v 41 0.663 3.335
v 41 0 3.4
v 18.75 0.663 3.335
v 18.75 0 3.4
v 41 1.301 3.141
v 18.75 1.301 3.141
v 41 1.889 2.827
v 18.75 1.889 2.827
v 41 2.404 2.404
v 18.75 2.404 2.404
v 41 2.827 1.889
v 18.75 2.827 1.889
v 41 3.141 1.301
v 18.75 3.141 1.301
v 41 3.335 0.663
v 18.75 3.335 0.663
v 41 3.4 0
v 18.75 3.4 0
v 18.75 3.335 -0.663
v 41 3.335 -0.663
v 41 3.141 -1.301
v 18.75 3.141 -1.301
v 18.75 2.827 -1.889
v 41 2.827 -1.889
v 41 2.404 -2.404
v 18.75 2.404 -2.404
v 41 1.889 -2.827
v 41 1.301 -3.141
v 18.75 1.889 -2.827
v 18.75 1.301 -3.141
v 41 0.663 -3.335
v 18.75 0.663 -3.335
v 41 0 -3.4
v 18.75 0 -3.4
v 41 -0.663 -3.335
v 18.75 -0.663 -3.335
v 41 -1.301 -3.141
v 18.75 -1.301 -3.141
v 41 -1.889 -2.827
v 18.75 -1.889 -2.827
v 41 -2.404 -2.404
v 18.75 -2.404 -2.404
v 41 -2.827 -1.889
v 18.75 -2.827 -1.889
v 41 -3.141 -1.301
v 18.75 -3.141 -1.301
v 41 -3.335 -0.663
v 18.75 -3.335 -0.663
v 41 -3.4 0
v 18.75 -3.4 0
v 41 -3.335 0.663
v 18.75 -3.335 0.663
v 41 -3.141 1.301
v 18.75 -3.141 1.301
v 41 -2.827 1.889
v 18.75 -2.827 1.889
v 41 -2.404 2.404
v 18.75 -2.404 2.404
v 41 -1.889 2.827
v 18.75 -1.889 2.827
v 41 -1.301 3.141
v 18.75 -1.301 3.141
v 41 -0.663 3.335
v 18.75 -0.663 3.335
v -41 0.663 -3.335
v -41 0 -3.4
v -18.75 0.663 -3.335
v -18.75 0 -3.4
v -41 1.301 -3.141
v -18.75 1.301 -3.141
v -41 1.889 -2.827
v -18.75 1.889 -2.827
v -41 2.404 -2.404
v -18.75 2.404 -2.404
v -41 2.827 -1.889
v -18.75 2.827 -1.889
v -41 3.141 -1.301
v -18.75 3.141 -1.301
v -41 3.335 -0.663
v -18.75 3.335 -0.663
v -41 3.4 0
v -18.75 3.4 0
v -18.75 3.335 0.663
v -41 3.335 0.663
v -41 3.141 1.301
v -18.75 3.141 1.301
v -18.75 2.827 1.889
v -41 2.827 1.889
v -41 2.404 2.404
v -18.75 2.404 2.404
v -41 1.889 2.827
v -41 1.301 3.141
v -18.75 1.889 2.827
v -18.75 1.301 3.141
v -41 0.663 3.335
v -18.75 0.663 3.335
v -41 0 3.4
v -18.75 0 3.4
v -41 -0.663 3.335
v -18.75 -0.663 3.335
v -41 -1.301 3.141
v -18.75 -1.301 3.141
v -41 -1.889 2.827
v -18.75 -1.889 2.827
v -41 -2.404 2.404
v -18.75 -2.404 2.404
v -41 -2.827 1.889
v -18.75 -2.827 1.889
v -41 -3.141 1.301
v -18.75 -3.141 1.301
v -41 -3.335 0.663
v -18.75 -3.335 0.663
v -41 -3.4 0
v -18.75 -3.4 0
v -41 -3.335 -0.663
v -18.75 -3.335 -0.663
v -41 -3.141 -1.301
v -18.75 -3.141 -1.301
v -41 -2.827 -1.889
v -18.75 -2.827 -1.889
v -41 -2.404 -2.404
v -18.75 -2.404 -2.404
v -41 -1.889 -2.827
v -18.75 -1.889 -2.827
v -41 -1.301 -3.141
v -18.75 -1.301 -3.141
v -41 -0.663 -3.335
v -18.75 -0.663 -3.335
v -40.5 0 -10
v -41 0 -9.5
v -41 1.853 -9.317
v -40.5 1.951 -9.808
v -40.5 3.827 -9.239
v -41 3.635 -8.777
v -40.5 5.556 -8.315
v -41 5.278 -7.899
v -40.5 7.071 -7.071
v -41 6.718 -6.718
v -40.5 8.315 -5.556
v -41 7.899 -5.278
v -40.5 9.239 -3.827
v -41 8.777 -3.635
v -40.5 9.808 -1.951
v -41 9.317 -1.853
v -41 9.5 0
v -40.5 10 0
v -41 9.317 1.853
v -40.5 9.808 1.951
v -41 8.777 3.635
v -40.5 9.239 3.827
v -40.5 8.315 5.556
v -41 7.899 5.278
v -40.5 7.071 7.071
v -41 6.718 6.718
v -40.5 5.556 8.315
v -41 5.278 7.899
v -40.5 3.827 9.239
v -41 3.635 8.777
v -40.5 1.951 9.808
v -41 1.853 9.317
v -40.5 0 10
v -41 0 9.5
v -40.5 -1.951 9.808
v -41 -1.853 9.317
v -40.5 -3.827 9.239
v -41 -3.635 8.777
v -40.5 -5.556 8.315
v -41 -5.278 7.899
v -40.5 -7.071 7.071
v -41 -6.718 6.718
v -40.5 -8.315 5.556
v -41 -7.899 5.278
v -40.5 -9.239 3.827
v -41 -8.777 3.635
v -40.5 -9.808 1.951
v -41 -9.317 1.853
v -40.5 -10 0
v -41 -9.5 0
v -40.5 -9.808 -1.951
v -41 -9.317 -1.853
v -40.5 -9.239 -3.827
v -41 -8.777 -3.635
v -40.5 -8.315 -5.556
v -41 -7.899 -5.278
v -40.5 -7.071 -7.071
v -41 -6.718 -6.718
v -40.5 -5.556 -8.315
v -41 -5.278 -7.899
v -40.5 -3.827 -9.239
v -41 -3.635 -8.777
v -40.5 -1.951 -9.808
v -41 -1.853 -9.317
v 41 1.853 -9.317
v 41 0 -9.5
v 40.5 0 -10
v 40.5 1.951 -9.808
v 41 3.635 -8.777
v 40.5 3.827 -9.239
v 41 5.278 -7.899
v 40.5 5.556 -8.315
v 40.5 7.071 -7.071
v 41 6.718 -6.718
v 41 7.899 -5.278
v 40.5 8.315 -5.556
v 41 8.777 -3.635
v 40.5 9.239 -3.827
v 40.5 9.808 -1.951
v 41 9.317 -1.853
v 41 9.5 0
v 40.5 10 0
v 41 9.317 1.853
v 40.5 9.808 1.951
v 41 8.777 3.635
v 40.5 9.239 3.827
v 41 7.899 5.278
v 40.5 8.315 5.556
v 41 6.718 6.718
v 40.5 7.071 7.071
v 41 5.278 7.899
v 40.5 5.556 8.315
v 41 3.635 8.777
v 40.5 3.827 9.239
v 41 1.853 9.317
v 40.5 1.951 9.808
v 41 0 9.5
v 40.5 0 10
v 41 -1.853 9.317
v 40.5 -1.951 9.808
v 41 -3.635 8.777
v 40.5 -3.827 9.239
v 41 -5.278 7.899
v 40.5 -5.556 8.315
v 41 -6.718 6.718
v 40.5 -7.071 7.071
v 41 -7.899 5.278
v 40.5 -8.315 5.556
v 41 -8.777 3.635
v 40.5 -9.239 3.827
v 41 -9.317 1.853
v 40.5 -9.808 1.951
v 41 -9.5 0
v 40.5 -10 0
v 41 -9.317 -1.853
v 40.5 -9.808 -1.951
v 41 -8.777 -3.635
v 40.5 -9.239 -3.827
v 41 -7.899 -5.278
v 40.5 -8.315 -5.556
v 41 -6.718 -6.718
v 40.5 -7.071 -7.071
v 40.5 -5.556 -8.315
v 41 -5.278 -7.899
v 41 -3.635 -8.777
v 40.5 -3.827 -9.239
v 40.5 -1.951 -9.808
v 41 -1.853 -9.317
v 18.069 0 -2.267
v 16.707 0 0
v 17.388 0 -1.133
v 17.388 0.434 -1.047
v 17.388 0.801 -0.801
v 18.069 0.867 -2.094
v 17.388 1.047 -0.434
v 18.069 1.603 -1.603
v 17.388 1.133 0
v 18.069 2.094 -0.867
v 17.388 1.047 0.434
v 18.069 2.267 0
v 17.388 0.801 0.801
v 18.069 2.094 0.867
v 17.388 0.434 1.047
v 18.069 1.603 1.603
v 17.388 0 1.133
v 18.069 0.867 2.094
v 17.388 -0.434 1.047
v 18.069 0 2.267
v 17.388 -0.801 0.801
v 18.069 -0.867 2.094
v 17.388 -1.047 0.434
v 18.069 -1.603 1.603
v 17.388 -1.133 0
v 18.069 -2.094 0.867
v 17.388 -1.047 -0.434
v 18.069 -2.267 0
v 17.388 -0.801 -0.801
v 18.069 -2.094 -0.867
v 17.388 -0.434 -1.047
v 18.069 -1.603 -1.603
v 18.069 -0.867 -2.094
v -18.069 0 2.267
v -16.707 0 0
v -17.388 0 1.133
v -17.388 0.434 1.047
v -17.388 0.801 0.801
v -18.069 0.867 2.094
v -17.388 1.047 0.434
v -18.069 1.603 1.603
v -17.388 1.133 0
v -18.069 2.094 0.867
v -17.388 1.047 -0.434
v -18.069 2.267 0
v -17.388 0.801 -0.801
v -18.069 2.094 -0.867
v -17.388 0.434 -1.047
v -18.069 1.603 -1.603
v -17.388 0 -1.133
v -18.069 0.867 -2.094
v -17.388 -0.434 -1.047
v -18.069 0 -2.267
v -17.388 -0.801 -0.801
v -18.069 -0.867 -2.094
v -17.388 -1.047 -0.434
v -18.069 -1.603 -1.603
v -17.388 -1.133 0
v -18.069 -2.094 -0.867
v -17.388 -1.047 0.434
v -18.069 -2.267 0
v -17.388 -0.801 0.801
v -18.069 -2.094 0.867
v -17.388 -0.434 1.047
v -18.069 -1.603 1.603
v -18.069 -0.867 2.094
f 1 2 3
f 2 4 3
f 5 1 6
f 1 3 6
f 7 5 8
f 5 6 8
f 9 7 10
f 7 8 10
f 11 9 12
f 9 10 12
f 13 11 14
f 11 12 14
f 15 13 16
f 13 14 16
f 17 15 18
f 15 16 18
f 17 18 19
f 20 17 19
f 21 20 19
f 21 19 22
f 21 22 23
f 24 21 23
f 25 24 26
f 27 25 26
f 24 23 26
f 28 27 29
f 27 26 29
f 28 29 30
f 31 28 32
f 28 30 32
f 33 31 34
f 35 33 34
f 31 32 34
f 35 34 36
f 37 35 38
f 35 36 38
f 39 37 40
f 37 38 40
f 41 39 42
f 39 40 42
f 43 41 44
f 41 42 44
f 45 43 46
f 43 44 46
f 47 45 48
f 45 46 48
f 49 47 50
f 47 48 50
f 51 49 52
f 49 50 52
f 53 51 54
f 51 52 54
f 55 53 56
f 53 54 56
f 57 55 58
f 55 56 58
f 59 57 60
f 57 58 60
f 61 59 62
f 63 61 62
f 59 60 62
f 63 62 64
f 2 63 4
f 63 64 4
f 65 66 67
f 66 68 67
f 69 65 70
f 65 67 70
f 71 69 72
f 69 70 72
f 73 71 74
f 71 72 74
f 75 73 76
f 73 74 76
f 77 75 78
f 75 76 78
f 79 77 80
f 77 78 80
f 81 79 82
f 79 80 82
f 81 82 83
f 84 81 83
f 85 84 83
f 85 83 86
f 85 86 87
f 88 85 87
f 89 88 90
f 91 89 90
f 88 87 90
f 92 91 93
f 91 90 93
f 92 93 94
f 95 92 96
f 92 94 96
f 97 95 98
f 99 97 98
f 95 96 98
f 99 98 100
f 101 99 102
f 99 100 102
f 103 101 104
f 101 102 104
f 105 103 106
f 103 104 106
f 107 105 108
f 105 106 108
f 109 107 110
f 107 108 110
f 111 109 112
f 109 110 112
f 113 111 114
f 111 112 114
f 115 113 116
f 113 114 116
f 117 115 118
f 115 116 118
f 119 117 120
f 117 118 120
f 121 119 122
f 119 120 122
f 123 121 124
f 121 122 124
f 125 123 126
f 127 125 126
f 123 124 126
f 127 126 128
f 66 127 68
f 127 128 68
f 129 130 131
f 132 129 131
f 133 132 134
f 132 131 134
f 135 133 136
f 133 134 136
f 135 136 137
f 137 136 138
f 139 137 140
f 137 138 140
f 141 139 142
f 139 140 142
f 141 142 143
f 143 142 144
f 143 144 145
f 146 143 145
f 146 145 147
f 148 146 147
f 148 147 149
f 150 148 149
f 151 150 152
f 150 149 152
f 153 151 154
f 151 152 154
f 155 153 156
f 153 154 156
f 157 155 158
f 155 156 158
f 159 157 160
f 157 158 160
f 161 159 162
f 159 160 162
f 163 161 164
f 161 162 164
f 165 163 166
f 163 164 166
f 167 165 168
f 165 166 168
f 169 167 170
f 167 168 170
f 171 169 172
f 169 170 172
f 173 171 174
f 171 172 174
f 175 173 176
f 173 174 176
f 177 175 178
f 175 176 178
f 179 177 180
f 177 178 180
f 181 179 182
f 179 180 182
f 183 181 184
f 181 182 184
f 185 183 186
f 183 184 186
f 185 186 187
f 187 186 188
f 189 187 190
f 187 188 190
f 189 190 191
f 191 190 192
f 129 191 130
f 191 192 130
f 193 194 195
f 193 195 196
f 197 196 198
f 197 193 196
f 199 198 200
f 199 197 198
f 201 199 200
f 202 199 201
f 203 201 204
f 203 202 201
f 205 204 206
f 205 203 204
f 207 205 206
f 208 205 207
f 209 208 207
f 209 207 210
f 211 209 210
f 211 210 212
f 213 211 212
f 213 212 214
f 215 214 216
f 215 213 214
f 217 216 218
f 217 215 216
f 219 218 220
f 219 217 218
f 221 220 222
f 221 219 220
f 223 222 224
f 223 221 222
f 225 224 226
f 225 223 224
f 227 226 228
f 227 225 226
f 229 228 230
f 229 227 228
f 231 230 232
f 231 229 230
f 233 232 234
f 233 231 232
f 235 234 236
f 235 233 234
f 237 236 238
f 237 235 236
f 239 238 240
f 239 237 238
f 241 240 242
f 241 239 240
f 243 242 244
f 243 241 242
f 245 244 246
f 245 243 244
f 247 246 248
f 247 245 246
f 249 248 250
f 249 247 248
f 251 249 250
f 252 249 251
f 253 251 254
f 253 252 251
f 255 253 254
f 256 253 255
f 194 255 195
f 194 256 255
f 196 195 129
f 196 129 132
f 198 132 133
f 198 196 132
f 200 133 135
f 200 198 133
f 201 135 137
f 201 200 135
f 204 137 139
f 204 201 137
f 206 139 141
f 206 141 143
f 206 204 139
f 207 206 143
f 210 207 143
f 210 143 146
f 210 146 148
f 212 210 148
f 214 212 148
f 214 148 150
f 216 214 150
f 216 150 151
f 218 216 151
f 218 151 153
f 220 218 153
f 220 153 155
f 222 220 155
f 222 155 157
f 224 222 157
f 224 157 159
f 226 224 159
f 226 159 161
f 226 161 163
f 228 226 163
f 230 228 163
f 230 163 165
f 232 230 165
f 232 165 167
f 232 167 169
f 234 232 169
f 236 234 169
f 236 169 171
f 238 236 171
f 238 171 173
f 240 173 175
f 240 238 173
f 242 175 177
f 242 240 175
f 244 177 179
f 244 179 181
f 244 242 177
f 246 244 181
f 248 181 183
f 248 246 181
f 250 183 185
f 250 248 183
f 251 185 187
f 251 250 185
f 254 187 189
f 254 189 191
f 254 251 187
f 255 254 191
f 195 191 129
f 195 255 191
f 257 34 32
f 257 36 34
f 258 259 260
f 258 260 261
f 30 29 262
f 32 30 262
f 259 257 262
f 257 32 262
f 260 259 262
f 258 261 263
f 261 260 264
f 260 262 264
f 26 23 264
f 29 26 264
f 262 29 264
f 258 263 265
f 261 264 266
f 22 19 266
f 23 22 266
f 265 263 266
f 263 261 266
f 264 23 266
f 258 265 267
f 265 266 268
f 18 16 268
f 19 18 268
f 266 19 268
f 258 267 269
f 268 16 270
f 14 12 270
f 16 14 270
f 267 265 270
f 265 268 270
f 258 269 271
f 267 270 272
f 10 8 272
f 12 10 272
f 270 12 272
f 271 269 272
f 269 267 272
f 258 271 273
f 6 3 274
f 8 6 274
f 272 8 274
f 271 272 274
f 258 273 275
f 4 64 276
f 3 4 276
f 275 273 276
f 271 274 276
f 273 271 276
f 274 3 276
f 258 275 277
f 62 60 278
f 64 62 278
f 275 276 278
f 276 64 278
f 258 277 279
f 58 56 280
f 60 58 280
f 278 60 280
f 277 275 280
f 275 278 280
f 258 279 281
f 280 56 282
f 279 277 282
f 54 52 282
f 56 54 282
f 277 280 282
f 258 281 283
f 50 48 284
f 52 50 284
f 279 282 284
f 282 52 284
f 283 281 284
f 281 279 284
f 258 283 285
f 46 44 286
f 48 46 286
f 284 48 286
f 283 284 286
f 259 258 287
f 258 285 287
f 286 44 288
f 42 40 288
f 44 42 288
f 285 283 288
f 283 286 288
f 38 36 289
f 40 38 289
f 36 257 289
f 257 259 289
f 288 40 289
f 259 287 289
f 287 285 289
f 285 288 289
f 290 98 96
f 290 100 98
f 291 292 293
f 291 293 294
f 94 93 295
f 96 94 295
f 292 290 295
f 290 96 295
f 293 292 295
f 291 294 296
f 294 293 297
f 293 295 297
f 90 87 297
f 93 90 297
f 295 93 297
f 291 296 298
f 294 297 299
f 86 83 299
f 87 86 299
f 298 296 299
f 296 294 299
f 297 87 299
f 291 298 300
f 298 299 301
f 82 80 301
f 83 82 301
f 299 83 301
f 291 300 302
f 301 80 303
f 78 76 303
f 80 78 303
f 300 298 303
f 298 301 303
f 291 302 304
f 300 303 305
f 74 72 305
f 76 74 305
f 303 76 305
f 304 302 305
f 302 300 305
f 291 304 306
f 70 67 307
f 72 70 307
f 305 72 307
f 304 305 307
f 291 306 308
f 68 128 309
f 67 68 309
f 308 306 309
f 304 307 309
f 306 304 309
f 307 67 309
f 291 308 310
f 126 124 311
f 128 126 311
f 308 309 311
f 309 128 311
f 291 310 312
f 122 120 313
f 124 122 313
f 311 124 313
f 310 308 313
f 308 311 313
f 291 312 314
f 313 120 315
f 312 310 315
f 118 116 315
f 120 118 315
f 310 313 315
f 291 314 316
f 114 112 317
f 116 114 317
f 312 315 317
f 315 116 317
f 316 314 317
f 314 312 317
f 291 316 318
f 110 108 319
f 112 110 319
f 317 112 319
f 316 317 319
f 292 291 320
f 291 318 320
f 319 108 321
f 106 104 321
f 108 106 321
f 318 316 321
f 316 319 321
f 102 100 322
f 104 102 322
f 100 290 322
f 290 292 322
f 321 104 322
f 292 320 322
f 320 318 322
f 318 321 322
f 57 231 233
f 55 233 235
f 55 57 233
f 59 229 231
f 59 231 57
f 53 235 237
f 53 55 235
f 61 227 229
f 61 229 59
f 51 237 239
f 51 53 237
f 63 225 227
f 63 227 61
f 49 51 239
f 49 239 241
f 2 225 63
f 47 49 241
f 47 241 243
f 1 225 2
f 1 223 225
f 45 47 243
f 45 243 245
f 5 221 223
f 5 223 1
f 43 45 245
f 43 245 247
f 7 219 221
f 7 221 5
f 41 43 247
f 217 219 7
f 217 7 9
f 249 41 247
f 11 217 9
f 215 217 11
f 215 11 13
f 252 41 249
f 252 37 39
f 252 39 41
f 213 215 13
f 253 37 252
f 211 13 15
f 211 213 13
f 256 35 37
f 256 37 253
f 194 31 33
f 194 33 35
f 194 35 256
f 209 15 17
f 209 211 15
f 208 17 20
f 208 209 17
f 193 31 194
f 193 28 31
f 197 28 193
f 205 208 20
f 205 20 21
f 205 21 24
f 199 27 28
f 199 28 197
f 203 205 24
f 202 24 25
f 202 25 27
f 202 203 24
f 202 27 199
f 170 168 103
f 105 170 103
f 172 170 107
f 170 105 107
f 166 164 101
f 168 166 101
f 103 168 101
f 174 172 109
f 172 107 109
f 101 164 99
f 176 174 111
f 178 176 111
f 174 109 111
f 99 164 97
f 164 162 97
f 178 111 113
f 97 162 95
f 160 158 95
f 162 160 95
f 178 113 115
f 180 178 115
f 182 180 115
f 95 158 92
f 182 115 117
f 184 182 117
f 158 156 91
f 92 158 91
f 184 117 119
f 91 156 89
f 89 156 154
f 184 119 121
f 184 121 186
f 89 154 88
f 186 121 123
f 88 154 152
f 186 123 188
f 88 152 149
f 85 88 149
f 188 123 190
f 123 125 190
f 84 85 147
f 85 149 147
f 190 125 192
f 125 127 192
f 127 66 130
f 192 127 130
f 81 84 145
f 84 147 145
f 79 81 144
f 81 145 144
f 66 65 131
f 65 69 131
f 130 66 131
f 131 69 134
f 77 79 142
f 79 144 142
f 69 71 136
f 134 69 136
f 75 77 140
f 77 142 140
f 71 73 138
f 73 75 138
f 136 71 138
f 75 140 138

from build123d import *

# Parameters (mm, degrees)
SKETCH1_R             = 10
BOSS_EXTRUDE1_DEPTH   = 41
CHAMFER1_SIZE         = 0.5
M8_TAPPED_HOLE1_D     = 6.8
M8_TAPPED_HOLE1_DEPTH = 22.25
M8_TAPPED_HOLE1_TIP   = 2.042926105
M8_TAPPED_HOLE2_D     = 6.8
M8_TAPPED_HOLE2_DEPTH = 22.25
M8_TAPPED_HOLE2_TIP   = 2.042926105


with BuildPart() as part:
    # Sketch1 → Boss-Extrude1 (new, symmetric)
    with BuildSketch(Plane(origin=(0, 0, 0), x_dir=(0, 0, -1), z_dir=(1, 0, 0))):
        Circle(SKETCH1_R)
    extrude(amount=BOSS_EXTRUDE1_DEPTH, both=True)

    # Chamfer1
    chamfer1_edges = [part.edges().sort_by_distance(p)[0] for p in [
        (-41, 0, 10),
        (41, 0, 10),
    ]]
    chamfer(chamfer1_edges, length=CHAMFER1_SIZE)

    # M8 Tapped Hole1
    with Locations(Plane(origin=(41, 0, 0), x_dir=(0, 0, -1), z_dir=(1, 0, 0))):
        with Locations((0, 0)):
            Hole(M8_TAPPED_HOLE1_D / 2, depth=M8_TAPPED_HOLE1_DEPTH)
            with Locations((0, 0, -(M8_TAPPED_HOLE1_DEPTH + M8_TAPPED_HOLE1_TIP / 2))):  # 118° drill point
                Cone(0, M8_TAPPED_HOLE1_D / 2, M8_TAPPED_HOLE1_TIP, mode=Mode.SUBTRACT)

    # M8 Tapped Hole2
    with Locations(Plane.ZY.offset(41)):
        with Locations((0, 0)):
            Hole(M8_TAPPED_HOLE2_D / 2, depth=M8_TAPPED_HOLE2_DEPTH)
            with Locations((0, 0, -(M8_TAPPED_HOLE2_DEPTH + M8_TAPPED_HOLE2_TIP / 2))):  # 118° drill point
                Cone(0, M8_TAPPED_HOLE2_D / 2, M8_TAPPED_HOLE2_TIP, mode=Mode.SUBTRACT)


solid = part.part
